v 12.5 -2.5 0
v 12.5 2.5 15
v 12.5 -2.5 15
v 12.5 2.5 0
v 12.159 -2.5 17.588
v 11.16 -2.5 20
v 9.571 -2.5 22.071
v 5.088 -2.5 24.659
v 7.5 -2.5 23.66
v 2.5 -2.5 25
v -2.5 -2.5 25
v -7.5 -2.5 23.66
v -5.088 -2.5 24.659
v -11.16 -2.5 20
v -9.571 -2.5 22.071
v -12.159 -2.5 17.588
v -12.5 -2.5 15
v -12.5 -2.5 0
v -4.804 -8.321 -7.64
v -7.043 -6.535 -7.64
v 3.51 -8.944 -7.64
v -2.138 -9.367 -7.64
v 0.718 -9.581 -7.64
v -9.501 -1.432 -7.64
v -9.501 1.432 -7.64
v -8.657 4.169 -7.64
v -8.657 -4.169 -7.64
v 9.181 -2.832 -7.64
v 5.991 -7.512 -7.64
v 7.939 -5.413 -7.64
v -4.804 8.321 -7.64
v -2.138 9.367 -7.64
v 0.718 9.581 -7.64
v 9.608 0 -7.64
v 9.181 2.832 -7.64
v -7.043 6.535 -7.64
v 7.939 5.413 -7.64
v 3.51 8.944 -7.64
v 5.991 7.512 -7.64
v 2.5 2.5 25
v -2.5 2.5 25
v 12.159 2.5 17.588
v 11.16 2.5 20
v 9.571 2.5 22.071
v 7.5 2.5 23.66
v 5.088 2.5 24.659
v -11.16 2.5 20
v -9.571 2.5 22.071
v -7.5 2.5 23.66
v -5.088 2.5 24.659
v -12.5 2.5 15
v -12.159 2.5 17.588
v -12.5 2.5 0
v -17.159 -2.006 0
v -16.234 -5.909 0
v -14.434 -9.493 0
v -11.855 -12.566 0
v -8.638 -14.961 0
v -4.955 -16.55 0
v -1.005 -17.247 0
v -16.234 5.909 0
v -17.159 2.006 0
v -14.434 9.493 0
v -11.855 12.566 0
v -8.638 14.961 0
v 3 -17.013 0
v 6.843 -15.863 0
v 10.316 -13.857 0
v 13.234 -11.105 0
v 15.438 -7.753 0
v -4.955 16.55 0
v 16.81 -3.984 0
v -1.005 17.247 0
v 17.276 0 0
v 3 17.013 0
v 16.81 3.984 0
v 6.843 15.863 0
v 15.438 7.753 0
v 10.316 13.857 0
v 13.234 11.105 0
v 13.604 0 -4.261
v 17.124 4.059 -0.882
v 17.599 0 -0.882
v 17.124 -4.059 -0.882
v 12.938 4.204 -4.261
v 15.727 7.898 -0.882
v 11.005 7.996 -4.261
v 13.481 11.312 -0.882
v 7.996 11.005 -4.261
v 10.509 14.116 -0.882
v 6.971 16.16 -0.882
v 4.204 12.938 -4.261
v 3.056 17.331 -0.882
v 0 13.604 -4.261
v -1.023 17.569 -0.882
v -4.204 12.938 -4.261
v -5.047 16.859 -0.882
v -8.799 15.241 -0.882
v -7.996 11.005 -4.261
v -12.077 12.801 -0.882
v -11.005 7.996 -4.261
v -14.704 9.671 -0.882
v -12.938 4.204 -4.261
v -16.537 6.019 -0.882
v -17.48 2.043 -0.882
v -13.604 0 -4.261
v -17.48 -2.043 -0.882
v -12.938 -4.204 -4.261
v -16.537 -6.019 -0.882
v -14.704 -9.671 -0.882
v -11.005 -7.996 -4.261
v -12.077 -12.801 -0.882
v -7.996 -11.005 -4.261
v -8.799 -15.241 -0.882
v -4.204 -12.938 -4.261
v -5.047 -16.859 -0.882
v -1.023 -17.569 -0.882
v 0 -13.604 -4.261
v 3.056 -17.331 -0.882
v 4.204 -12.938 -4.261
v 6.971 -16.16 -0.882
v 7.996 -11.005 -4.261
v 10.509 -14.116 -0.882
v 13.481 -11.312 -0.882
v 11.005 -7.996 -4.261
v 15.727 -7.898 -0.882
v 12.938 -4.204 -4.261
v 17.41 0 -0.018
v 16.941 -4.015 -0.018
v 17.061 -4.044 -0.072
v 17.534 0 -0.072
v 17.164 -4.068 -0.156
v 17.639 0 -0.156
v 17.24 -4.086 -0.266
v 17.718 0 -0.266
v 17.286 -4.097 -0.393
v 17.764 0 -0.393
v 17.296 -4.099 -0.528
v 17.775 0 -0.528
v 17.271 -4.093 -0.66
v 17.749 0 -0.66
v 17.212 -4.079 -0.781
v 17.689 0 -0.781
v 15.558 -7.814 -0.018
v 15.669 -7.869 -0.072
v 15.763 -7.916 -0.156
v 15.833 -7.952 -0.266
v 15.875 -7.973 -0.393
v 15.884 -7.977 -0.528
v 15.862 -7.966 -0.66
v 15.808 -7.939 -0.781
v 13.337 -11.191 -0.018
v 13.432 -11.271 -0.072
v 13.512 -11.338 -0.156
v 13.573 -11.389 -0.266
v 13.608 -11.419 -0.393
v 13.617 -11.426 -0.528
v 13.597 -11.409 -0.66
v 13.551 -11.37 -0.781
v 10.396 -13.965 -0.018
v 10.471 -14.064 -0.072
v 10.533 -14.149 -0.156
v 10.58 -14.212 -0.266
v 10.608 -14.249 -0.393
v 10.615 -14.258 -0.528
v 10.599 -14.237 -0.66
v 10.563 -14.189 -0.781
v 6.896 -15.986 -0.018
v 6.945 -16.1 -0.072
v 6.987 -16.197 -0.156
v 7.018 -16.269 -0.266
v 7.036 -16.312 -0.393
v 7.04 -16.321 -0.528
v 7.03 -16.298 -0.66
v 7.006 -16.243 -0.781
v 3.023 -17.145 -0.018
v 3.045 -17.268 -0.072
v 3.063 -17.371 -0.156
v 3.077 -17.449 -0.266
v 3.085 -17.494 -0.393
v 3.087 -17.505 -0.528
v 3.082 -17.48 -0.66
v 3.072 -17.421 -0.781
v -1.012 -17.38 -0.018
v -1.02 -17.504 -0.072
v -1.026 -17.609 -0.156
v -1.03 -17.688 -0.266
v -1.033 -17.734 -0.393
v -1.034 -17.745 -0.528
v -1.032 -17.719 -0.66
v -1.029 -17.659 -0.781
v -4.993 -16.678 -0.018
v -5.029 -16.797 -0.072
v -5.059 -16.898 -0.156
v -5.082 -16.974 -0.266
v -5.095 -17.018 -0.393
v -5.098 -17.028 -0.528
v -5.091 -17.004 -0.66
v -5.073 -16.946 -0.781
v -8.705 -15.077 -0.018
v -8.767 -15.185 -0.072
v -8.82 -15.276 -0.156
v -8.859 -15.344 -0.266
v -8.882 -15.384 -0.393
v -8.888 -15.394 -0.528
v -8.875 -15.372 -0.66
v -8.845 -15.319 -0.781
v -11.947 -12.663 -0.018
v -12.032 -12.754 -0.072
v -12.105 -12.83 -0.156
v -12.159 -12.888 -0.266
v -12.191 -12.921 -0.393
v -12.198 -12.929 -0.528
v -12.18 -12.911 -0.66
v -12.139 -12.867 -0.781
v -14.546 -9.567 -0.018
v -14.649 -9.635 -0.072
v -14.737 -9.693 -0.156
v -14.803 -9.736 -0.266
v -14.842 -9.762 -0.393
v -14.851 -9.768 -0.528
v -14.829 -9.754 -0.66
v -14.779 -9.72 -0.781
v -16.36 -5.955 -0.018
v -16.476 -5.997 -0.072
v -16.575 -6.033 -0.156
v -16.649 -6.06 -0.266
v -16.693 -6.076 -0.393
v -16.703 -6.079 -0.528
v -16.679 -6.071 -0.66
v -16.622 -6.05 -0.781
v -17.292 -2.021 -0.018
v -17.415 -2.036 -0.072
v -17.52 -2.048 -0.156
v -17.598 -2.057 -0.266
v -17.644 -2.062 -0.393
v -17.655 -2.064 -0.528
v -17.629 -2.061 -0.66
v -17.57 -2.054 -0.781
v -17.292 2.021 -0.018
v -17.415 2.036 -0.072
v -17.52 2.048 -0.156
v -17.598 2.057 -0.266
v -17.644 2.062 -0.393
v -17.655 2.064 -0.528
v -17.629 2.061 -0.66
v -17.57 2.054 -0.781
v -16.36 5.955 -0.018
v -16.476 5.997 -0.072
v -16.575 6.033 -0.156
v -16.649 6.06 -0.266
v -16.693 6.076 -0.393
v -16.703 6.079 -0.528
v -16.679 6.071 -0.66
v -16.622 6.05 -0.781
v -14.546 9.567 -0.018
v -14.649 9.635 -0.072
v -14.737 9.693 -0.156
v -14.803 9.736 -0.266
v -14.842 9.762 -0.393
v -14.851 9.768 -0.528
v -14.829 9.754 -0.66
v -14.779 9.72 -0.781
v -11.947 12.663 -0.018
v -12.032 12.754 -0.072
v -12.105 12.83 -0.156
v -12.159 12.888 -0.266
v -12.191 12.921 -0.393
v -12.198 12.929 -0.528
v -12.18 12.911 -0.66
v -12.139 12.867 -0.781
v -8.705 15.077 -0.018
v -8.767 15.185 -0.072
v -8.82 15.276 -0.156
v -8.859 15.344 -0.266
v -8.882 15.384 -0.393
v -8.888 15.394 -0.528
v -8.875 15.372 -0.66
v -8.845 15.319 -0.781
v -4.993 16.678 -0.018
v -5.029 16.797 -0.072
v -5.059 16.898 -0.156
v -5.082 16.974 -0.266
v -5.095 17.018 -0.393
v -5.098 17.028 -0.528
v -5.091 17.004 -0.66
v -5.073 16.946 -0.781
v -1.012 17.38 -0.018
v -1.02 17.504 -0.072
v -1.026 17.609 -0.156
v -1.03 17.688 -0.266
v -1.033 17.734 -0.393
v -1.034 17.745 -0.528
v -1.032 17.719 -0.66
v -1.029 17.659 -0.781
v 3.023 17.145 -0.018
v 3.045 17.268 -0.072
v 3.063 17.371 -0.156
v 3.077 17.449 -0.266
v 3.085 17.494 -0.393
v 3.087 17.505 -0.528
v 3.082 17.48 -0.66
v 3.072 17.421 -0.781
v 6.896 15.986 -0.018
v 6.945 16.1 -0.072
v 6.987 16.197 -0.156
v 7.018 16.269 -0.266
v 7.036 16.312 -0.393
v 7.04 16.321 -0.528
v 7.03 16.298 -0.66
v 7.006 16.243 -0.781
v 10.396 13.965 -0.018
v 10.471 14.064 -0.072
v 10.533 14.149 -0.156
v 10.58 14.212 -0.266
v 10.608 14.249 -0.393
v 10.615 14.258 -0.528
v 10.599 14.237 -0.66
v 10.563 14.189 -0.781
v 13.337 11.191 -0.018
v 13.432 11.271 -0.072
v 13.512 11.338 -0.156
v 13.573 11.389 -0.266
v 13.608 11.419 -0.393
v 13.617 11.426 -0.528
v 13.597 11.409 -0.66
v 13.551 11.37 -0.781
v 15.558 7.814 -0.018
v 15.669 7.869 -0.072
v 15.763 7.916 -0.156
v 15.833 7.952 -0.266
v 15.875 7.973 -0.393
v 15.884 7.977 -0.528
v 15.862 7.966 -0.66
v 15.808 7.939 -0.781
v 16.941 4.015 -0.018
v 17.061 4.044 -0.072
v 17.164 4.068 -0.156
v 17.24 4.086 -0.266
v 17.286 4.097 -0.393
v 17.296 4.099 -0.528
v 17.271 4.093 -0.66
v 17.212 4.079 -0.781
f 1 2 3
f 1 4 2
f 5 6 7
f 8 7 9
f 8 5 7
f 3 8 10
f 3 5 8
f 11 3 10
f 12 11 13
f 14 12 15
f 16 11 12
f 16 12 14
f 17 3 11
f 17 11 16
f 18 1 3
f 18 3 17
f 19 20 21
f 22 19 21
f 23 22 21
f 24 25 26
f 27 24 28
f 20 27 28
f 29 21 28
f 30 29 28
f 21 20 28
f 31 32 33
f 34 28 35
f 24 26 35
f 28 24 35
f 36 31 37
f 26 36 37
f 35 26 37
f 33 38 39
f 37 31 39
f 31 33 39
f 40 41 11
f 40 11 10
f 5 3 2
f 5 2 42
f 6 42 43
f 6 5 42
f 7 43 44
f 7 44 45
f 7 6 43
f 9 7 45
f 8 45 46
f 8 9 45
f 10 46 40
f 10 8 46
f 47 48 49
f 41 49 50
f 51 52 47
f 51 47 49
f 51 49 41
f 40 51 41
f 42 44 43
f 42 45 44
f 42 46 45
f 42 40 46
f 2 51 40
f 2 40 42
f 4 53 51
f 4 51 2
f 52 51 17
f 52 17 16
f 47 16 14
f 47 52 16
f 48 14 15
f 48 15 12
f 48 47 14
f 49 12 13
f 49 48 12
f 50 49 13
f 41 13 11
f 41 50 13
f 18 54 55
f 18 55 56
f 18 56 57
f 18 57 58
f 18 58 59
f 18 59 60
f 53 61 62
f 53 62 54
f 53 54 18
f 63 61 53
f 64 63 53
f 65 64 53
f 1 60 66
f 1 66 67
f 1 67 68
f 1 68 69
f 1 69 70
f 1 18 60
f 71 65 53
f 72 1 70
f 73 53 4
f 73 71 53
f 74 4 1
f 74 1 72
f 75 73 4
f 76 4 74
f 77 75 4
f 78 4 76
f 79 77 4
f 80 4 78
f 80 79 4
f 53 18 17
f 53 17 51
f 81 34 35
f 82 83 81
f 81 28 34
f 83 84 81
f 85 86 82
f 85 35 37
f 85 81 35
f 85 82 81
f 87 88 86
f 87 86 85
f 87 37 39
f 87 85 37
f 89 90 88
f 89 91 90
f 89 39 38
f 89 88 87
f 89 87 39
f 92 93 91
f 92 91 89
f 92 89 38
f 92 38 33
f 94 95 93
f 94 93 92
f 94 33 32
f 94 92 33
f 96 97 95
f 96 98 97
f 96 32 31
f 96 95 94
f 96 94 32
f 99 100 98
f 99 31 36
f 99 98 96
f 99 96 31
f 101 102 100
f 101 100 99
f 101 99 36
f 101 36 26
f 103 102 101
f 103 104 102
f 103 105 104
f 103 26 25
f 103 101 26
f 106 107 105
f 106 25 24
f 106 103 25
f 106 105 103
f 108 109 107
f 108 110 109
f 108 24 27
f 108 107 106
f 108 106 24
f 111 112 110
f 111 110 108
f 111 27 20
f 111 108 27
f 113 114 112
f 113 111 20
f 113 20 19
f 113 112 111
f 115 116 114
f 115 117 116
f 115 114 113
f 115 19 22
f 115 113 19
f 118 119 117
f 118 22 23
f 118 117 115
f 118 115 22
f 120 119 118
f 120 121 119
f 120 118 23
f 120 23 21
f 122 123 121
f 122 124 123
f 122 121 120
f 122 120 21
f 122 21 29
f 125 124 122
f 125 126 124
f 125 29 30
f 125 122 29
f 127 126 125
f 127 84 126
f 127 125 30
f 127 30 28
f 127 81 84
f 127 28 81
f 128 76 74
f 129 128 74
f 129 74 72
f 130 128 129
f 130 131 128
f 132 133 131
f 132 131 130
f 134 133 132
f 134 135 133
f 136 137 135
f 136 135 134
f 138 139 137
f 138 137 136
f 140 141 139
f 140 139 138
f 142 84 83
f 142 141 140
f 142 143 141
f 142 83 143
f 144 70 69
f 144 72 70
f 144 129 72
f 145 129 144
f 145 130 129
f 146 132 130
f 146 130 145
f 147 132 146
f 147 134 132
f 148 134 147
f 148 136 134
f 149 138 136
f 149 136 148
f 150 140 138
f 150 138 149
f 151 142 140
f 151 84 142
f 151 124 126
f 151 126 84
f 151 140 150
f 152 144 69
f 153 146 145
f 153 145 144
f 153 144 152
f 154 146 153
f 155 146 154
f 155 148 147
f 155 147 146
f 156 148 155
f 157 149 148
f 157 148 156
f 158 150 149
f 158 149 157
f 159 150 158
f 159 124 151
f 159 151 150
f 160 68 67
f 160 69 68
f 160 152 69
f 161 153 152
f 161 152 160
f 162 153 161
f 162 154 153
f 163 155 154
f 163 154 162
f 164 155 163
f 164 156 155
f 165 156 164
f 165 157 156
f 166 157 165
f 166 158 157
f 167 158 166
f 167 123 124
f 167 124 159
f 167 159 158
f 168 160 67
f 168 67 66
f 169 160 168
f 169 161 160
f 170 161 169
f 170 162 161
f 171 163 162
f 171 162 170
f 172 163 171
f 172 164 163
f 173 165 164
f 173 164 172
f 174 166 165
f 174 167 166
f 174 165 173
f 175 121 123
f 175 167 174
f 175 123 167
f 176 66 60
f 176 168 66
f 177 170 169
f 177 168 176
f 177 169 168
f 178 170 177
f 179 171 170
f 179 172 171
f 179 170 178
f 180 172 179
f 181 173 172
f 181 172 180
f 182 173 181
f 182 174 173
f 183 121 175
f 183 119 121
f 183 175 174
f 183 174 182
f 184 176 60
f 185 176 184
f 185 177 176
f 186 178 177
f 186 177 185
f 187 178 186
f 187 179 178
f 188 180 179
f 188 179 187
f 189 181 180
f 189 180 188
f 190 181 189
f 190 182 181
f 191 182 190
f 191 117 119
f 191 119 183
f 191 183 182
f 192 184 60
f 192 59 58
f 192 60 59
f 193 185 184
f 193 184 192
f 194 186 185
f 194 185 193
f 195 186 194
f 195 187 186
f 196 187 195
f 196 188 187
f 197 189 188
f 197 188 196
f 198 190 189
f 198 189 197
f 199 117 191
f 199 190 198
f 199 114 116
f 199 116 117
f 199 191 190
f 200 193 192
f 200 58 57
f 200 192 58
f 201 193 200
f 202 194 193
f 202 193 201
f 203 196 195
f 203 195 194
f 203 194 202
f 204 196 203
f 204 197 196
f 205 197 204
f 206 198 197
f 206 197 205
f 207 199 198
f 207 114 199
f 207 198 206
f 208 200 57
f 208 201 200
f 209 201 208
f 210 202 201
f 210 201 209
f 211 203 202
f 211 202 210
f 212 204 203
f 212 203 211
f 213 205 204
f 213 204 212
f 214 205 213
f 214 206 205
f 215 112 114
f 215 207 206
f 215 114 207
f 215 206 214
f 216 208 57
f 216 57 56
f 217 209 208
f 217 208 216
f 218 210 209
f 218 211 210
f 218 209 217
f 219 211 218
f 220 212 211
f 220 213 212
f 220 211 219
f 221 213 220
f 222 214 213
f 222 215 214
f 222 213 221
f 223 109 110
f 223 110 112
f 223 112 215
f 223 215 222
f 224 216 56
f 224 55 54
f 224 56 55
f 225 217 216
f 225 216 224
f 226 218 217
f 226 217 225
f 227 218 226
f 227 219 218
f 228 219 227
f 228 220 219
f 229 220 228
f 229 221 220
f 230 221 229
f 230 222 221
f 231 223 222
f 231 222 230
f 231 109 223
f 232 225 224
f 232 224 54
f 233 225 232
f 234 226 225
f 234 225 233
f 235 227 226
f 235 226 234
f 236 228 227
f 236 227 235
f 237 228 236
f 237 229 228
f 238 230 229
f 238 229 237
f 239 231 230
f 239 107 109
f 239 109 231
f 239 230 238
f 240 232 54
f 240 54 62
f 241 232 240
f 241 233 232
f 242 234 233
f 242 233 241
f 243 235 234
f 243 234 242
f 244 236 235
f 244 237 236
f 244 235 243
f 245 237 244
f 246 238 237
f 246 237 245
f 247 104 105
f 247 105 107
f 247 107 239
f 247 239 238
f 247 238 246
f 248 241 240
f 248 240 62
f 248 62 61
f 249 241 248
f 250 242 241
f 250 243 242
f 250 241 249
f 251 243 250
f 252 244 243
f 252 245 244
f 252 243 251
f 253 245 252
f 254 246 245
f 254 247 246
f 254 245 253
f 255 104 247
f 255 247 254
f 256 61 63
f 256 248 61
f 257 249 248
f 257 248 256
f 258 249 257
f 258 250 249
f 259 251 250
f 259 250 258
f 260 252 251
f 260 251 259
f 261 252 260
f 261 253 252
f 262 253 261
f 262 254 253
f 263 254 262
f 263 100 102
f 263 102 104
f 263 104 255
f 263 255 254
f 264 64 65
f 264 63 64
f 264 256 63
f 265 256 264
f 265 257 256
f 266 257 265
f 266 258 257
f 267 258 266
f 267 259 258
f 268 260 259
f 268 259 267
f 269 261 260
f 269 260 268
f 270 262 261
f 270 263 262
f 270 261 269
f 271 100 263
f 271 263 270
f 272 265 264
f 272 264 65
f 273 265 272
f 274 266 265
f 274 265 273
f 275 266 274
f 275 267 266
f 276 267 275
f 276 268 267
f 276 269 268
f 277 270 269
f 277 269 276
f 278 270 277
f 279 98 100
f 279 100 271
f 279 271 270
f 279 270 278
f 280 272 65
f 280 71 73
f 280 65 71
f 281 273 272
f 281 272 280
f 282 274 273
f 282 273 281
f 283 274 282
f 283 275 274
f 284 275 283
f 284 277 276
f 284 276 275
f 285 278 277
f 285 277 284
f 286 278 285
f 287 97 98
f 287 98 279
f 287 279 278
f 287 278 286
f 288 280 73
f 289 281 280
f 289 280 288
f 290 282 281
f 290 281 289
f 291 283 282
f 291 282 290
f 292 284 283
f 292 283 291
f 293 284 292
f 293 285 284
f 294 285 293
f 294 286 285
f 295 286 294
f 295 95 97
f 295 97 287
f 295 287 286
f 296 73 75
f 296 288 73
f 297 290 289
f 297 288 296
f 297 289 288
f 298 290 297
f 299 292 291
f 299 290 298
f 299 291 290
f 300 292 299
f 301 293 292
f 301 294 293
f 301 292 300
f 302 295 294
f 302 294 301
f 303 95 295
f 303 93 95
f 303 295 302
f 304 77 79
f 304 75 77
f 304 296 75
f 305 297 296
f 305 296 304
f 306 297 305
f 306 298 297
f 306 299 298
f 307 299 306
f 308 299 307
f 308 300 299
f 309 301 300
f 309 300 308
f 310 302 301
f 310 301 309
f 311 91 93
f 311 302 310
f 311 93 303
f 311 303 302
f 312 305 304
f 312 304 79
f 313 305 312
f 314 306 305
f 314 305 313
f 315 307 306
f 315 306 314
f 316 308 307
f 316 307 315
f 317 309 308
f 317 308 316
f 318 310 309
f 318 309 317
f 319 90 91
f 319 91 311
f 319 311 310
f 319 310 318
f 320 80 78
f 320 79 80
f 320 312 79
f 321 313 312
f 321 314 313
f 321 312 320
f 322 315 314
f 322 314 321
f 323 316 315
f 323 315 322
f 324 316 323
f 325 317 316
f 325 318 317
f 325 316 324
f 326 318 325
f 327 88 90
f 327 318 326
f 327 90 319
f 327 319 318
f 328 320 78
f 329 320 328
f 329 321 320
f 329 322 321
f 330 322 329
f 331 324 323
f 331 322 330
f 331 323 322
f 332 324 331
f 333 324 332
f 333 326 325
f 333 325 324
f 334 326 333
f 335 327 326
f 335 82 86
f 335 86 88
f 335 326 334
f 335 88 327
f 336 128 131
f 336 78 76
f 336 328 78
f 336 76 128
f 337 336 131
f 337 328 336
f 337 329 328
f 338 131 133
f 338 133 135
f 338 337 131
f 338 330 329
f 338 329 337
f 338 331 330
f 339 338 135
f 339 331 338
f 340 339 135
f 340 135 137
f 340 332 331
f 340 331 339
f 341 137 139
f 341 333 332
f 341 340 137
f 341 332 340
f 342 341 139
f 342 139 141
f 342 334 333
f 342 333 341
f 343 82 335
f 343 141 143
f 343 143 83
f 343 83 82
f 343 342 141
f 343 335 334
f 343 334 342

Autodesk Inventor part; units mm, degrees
ref_plane "YZ Plane" through (0, 0, 0) normal (1, 0, 0) x (0, 1, 0)
ref_plane "XZ Plane" through (0, 0, 0) normal (0, 1, 0) x (-1, 0, 0)
sketch "Sketch7" plane through (0, 0, 0) normal (0, 1, 0) x (-1, 0, 0)
  line L0 (0, 0) -> (0, 15.7673)
  line L1 (0, 0) -> (-13.3368, 0) construction
  line L2 (0, 15.7673) -> (-13.3368, 0) construction
  line L3 (0, 15.7673) -> (-18.6413, 0) construction
  line L4 (0, 15.7673) -> (-12.4569, -5.231) construction
  line L5 (0, 0) -> (0, -15.7673)
  line L6 (0, -15.7673) -> (-13.3368, 0) construction
  line L7 (0, -15.7673) -> (-18.6413, 0) construction
  line L8 (0, -15.7673) -> (-12.4569, 5.231) construction
  line L9 (-12.4569, 5.231) -> (-18.6413, 0) construction
  line L10 (-9.3537, 0) -> (-18.5948, -7.8164) construction
  line L11 (-9.3537, 0) -> (-18.0926, 7.3915) construction
  line L12 (0, -29.7093) -> (0, 66.7435) projected
  line L13 (-53.5, -5.9919) -> (-53.5, 6.008)
  line L14 (17.5786, 0) -> (-94.9714, 0) projected
  line L15 (-15.989, 2.2434) -> (-10.6846, -2.2434) construction
  line L16 (-10.6846, 2.2434) -> (-15.989, -2.2434) construction
  line L17 (-26.151, -15.9303) -> (-40.3783, -15.9303) construction
  line L18 (-40.3783, -15.9303) -> (-40.3783, -12.7539) construction
  line L19 (-40.3783, -12.7539) -> (-26.151, -12.7539) construction
  line L20 (-26.151, -12.7539) -> (-26.151, -15.9303) construction
  point P0 (-53.5, 0)
  dimension "Roller_Side_difference" = -0.0003
  dimension "d90" = 15.7673
  dimension "d201" = 53.5
  dimension "d343" = 99.548
  dimension "d344" = 99.549
  dimension "d367" = 8.1
sketch "Sketch1" plane through (0, 0, 0) normal (0, 0, 1) x (1, 0, 0)
  circle A0 centre (0, 0) radius 13.3368 construction
  line L0 (0, 0) -> (13.3368, 0)
  line L1 (0, 0) -> (13.3368, 4.025)
  line L2 (13.3368, 0) -> (13.3368, 4.025)
  circle A1 centre (0, 0) radius 53.5
  point P0 (56.8, 0)
  dimension "d56" = 13.3368
  dimension "d57" = 4.025
  dimension "d400" = 53.5
  dimension "d495" = 2.5
  dimension "d496" = 8
  dimension "d531" = 5.5
  dimension "d532" = 5.5
  dimension "d533" = 5.5
  dimension "d537" = 24.5
  dimension "d538" = 3
  dimension "d543" = 5.5
  dimension "d549" = 3
  dimension "d550" = 3
  dimension "d567" = 5.5
  dimension "d568" = 5.5
sketch "Roller1" plane through (0, 0, 0) normal (0, 1, 0) x (-1, 0, 0)
  line L0 (0, 15.7673) -> (-12.4569, -5.231) construction
  line L1 (0, 15.7673) -> (-18.6413, 0) construction
  line L2 (-9.3537, 0) -> (-18.0926, 7.3915) construction
  line L3 (0, -15.7673) -> (-18.6413, 0) construction
  line L4 (-9.4248, -0.0708) -> (-12.4245, -5.1274)
  line L5 (-12.4245, -5.1274) -> (-18.5445, 0.0491)
  line L6 (-18.5445, 0.0491) -> (-14.0556, 3.846)
  line L7 (-14.0556, 3.846) -> (-9.4248, -0.0708)
  line L8 (-11.7456, 1.8921) -> (-15.4898, -2.5346)
  line L9 (-10.9821, 1.2463) -> (-14.7263, -3.1804)
  point P0 (0, 0)
  point P1 (-15.4845, -2.5391)
  dimension "d345" = 0.025
  dimension "d346" = 0.025
  dimension "d347" = 0.1
  dimension "d348" = 0.1
  dimension "d349" = 99.549
  dimension "d350" = 99.548
  dimension "d357" = 1
  dimension "d369" = 4.0148
sketch "Roller2" plane through (0, 0, 0) normal (0, 1, 0) x (-1, 0, 0)
  line L0 (0, -15.7673) -> (-12.4569, 5.231) construction
  line L1 (-9.3537, 0) -> (-18.5948, -7.8164) construction
  line L2 (0, -15.7673) -> (-18.6413, 0) construction
  line L3 (0, 15.7673) -> (-18.6413, 0) construction
  line L4 (-12.4245, 5.1274) -> (-9.4248, 0.0708)
  line L5 (-9.4248, 0.0708) -> (-14.0556, -3.846)
  line L6 (-14.0556, -3.846) -> (-18.5445, -0.0491)
  line L7 (-18.5445, -0.0491) -> (-12.4245, 5.1274)
  line L8 (-15.4845, 2.5391) -> (-11.7403, -1.8876)
  line L9 (-14.721, 3.1849) -> (-10.9767, -1.2418)
  point P0 (0, 0)
  dimension "d351" = 0.025
  dimension "d352" = 0.025
  dimension "d354" = 0.1
  dimension "d355" = 99.548
  dimension "d356" = 99.549
  dimension "d370" = 0.1
  dimension "d371" = 1
sketch "Sketch22" plane through (0, 0, 0) normal (0, 1, 0) x (-1, 0, 0)
  line L0 (-31.756, 8.0215) -> (-17.5287, 8.0215) construction
  line L1 (-17.5287, 8.0215) -> (-17.5287, 4.8451) construction
  line L2 (-17.5287, 4.8451) -> (-31.756, 4.8451) construction
  line L3 (-31.756, 4.8451) -> (-31.756, 8.0215) construction
  point P0 (0, 0)
  dimension "Roller_Side_difference" = -0.0003
sketch "Sketch2" plane through (0, 0, 0) normal (0, 1, 0) x (-1, 0, 0)
  line L0 (0, 0) -> (0, 13.3368) construction
  line L1 (0, 0) -> (-13.3368, 0) projected
  line L2 (0, 0) -> (0, -13.3368)
  line L3 (0, -13.3368) -> (-13.3368, 0) construction
  line L4 (0, 13.3368) -> (-13.3368, 0) construction
  line L5 (-78.8928, 52.9645) -> (0, 13.3368) construction
  line L6 (-34.8011, 15.91) -> (0, 13.3368) construction
  line L7 (-34.8011, 15.91) -> (0, -13.3368) construction
  line L8 (-48.3339, 16.9106) -> (0, -13.3368) construction
  point P0 (-17.4708, -4.134)
sketch "Sketch23" plane through (0, 0, 0) normal (0, 1, 0) x (-1, 0, 0)
  line L0 (0, -15.7673) -> (-12.4569, 5.231) construction
  line L1 (0, -15.7673) -> (-18.6413, 0) construction
  line L2 (0, 15.7673) -> (-12.4569, -5.231) construction
  line L3 (-12.4569, 5.231) -> (-18.6413, 0) construction
  line L4 (0, 15.7673) -> (-18.6413, 0) construction
  line L5 (-12.4569, 5.231) -> (-12.4569, -5.231) construction
  line L6 (17.5786, 0) -> (-94.9714, 0) projected
  line L7 (-11.4508, 3.731) -> (-9.2677, 0.051)
  line L8 (-9.2677, -0.051) -> (-11.4508, -3.731)
  line L9 (-14.3852, 3.731) -> (-18.7059, 0.0764)
  line L10 (-18.7059, -0.0764) -> (-14.3852, -3.731)
  arc A0 (-18.7059, 0.0764) -> (-18.7059, -0.0764) centre (-18.6413, 0) ccw
  arc A1 (-9.2677, -0.051) -> (-9.2677, 0.051) centre (-9.3537, 0) ccw
  line L11 (-11.4508, 3.731) -> (-11.4508, 5.231)
  line L12 (-11.4508, 5.231) -> (-1, 5.231)
  line L13 (-1, 5.231) -> (-1, -5.231)
  line L14 (-1, -5.231) -> (-11.4508, -5.231)
  line L15 (-11.4508, -5.231) -> (-11.4508, -3.731)
  line L16 (-14.3852, 3.731) -> (-14.3852, 5.231)
  line L17 (-14.3852, 5.231) -> (-53.5, 5.231)
  line L18 (-53.5, 5.231) -> (-53.5, -5.231)
  line L19 (-14.3852, -3.731) -> (-14.3852, -5.231)
  line L20 (-14.3852, -5.231) -> (-53.5, -5.231)
  line L21 (-12.4569, 5.231) -> (-12.4569, 5.231)
  line L22 (-12.4569, -5.231) -> (-12.4569, -5.231)
  line L23 (0, -29.7093) -> (0, 66.7435) projected
  line L24 (-18.7962, 0) -> (-53.5, 0)
  point P0 (0, 0)
  point P1 (-9.2374, 0)
  point P2 (-18.7413, 0)
  point P3 (-53.5, 0)
  dimension "d378" = 90
  dimension "d379" = 0.1
  dimension "d380" = 0.1
  dimension "d381" = 0.1
  dimension "d382" = 0.1
  dimension "d383" = 0.1
  dimension "d384" = 10.4619
  dimension "d385" = 0
  dimension "d386" = 0
  dimension "d391" = 1
  dimension "d392" = 53.5
  dimension "d393" = 1.5
  dimension "d394" = 1.5
  dimension "d395" = 1.5
  dimension "d396" = 1.5
sketch "Sketch44" plane through (0, 0, 0) normal (0, 1, 0) x (-1, 0, 0)
  line L0 (-18.7962, 0) -> (3.1509, -18.5634)
  line L1 (17.5786, 0) -> (-94.9714, 0) projected
  line L2 (-11.4508, 5.231) -> (-1, 5.231) projected
  line L3 (-14.3852, 5.231) -> (-53.5, 5.231) projected
  line L4 (0, 0) -> (0, 15.7673) projected
  line L5 (0, 0) -> (0, -15.8983)
  line L6 (-25.707, -7.6404) -> (3.3976, -7.6404)
  line L7 (-18.6413, 0) -> (0, -15.7673)
  point P0 (-3.6044, 0)
  point P1 (-9.6083, -7.6404)
  point P2 (0, -7.6404)
  dimension "d615" = 0.1
revolve "Revolution17" add sketch "Sketch44" angle 360 about axis through (0, 0, 0) along (0, 0, 1) contours L1 L5 L6 L7
sketch "Sketch45" plane through (0, 0, 0) normal (0, 0, 1) x (1, 0, 0)
  line L0 (-12.5, 2.5) -> (12.5, 2.5)
  line L1 (12.5, 2.5) -> (12.5, -2.5)
  line L2 (12.5, -2.5) -> (-12.5, -2.5)
  line L3 (-12.5, -2.5) -> (-12.5, 2.5)
  line L4 (-12.5, 2.5) -> (12.5, -2.5) construction
  line L5 (12.5, 2.5) -> (-12.5, -2.5) construction
  point P0 (0, 0)
  dimension "d617" = 25
  dimension "d618" = 5
extrude "Extrusion39" add sketch "Sketch45" along normal blind 25
fillet "Fillet4" radius 10 2 edges at (-12.5, 0, 25) (12.5, 0, 25)
fillet "Fillet5" radius 0.5 1 edges at (-18.6413, 0, 0)
sketch "Sketch40" plane through (0, 0, -5.231) normal (0, 0, -1) x (-1, 0, 0)
  circle A0 centre (53.5, 0) radius 2.75 projected
  circle A1 centre (0, 0) radius 53.5 projected
  point P0 (53.4293, 2.7491)
  point P1 (53.4293, -2.7491)
  dimension "d585" = 8
  dimension "d587" = 1.75
  dimension "d589" = 3
  dimension "d592" = 2
  dimension "d593" = 12
  dimension "d594" = 12
  dimension "d611" = 360
equation "\"Roller_Side_difference\" = -0.001568deg"
equation "\"Cycloid_Top_Plate_Fasner_Inner\" = 61.25"
equation "\"Cycloid_Top_Plate_Fasner_Outer\" = 85.75"
equation "\"Roller_Hole_Radius\" = 1"
equation "\"Distance_To_Bearing\" = 20.65135"
equation "\"d514\" = 0.2"
properties part number "OuterRaceTool"
